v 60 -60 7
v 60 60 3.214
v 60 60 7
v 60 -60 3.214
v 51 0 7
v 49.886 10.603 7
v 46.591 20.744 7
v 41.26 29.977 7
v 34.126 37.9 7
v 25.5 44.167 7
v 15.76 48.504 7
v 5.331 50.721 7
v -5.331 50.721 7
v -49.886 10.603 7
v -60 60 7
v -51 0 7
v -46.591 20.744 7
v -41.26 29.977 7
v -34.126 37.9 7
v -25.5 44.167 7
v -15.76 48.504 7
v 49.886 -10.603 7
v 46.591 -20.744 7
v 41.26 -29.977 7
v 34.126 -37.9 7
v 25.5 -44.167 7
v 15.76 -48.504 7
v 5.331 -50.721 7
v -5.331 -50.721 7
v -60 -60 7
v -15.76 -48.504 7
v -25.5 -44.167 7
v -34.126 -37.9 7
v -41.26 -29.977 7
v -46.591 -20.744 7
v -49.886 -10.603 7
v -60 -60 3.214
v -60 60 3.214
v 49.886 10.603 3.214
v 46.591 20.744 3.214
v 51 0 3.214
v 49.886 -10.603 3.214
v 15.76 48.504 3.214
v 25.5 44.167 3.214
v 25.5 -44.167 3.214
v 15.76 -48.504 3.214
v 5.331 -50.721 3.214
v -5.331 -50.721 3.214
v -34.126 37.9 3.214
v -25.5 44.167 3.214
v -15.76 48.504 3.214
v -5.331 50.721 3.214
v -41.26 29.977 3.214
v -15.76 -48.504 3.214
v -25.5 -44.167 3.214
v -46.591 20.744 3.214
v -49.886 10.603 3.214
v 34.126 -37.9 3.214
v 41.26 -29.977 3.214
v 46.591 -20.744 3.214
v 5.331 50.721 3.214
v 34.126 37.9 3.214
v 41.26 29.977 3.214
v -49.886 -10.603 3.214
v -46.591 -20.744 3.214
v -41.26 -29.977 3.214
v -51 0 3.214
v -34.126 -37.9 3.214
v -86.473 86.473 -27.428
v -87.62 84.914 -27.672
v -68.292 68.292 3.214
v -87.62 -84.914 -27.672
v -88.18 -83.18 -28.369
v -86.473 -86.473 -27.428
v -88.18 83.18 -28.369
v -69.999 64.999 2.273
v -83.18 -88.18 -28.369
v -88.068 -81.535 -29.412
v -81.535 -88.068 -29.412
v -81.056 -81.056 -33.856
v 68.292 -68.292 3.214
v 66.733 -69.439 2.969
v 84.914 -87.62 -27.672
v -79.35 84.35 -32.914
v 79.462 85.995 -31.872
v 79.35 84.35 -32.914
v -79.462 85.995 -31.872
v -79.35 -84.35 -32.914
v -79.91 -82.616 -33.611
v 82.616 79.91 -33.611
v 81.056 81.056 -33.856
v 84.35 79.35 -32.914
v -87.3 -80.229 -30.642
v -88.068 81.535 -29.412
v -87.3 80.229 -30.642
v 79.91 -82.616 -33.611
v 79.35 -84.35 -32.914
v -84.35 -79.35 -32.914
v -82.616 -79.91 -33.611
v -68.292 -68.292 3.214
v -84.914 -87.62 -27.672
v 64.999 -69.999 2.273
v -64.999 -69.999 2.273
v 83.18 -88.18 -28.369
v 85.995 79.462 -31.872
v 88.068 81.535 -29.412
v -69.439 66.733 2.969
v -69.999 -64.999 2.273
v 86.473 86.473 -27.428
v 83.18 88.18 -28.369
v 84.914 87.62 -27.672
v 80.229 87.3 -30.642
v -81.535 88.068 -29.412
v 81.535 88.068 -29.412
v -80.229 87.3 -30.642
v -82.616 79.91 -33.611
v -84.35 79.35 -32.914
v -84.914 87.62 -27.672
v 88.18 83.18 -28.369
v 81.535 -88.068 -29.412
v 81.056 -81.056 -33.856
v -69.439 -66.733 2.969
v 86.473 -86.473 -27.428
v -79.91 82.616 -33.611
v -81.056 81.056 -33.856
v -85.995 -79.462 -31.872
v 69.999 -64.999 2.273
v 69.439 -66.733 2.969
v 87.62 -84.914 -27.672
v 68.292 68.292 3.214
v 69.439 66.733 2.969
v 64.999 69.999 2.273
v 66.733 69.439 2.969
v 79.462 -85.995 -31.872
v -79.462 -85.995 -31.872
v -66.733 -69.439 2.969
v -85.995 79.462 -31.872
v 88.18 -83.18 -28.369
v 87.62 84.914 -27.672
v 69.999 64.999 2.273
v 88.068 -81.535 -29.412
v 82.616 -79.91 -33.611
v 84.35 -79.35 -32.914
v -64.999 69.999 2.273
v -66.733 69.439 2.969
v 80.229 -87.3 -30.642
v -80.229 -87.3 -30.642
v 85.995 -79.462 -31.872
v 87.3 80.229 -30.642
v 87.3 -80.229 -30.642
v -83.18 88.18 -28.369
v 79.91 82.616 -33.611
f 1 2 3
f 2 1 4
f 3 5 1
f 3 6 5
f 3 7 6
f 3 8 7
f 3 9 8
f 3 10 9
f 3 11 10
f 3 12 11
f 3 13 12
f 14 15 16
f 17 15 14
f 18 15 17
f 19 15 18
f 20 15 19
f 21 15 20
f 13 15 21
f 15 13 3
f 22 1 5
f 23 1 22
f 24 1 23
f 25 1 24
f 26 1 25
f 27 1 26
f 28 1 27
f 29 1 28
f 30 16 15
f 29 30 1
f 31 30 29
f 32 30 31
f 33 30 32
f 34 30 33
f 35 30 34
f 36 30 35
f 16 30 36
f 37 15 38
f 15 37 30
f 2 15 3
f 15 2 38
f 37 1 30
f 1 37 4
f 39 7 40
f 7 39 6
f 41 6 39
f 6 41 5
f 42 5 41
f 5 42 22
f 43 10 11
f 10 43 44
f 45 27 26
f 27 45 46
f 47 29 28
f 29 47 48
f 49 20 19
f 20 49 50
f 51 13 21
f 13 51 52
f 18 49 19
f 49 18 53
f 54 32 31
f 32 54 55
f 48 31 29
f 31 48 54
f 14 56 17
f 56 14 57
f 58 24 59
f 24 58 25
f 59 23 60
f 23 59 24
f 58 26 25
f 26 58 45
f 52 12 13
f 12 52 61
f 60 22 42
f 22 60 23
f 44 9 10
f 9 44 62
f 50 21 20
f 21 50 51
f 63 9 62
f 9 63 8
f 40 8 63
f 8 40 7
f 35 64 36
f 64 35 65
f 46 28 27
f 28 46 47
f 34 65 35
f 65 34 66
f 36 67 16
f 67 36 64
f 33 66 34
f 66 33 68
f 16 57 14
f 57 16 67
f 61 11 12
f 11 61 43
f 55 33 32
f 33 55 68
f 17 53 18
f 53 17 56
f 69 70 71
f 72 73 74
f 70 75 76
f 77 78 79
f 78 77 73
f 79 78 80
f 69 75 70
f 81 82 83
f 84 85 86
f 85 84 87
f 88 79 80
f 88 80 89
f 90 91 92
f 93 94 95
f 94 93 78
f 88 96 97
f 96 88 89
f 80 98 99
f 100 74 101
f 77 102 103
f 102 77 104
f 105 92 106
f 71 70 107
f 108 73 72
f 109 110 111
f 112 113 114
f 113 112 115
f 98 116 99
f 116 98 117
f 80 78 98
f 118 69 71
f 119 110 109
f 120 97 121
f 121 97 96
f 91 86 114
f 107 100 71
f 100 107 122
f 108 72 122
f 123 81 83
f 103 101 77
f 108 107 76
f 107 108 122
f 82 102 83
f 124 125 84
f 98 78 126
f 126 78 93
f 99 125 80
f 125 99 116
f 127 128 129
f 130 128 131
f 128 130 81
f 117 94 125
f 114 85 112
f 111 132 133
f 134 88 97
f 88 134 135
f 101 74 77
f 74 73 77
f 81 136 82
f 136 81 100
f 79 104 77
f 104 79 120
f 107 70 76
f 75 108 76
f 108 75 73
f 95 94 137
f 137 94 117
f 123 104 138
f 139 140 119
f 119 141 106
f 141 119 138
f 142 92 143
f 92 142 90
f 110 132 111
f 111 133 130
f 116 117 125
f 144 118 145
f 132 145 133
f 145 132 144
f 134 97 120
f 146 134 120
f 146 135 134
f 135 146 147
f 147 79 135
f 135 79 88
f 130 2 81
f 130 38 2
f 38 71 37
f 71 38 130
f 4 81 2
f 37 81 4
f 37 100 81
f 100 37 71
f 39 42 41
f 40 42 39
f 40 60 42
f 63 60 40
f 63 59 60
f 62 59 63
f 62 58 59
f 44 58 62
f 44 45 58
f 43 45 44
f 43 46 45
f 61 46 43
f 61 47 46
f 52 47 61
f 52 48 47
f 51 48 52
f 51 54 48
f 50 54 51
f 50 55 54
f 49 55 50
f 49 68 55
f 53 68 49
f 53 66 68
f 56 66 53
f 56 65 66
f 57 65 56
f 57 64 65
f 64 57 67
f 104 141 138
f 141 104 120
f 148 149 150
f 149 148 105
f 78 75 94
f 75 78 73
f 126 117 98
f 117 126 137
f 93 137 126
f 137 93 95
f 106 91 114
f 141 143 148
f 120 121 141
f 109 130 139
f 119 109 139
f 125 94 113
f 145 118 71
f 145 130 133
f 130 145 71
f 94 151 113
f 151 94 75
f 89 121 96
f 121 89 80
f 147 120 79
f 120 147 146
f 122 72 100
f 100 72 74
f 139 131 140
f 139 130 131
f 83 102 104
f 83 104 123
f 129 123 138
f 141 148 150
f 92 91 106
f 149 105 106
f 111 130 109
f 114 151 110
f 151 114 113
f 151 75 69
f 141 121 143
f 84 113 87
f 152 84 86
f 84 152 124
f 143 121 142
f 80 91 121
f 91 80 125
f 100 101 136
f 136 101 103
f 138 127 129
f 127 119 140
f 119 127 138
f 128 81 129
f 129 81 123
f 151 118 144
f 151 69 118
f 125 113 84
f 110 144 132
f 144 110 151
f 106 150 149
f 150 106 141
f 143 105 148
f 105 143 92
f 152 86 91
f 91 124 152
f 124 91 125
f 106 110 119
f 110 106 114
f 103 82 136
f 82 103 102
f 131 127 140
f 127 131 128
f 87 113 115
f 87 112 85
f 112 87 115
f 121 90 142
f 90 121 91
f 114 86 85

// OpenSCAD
RT2 = sqrt(2);
PLATE_RD = 100/2;
SIDE_HT= 40;
SIDE_ANG = 40;
top_base_side = 2* PLATE_RD * 1.2;

translate([0,0,2]){
    difference(){
        cube([top_base_side, top_base_side, 10],center=true);
        translate([0,0,1]){
            cylinder(r=PLATE_RD * 1.02,h=5);
        }
    }
}

cyl_os = SIDE_HT/(4* cos(SIDE_ANG));


hull(){
    translate([-(RT2 * PLATE_RD + cyl_os),
                -(RT2 * PLATE_RD + cyl_os),
                -(SIDE_HT * cos(SIDE_ANG))]){
        rotate([0,SIDE_ANG,45]){
            cylinder(h = SIDE_HT, r = 5);
        }
    }

    translate([-(RT2 * PLATE_RD + cyl_os),
                (RT2 * PLATE_RD + cyl_os),
                -(SIDE_HT * cos(SIDE_ANG))]){
        rotate([0,SIDE_ANG,-45]){
            cylinder(h = SIDE_HT, r = 5);
        }
    }


    translate([(RT2 * PLATE_RD + cyl_os),
                (RT2 * PLATE_RD + cyl_os),
                -(SIDE_HT * cos(SIDE_ANG))]){
        rotate([0,-SIDE_ANG,45]){
            cylinder(h = SIDE_HT, r = 5);
        }
    }


    translate([(RT2 * PLATE_RD + cyl_os),
                -(RT2 * PLATE_RD + cyl_os),
                -(SIDE_HT * cos(SIDE_ANG))]){
        rotate([0,-SIDE_ANG,-45]){
            cylinder(h = SIDE_HT, r = 5);
        }
    }
}
